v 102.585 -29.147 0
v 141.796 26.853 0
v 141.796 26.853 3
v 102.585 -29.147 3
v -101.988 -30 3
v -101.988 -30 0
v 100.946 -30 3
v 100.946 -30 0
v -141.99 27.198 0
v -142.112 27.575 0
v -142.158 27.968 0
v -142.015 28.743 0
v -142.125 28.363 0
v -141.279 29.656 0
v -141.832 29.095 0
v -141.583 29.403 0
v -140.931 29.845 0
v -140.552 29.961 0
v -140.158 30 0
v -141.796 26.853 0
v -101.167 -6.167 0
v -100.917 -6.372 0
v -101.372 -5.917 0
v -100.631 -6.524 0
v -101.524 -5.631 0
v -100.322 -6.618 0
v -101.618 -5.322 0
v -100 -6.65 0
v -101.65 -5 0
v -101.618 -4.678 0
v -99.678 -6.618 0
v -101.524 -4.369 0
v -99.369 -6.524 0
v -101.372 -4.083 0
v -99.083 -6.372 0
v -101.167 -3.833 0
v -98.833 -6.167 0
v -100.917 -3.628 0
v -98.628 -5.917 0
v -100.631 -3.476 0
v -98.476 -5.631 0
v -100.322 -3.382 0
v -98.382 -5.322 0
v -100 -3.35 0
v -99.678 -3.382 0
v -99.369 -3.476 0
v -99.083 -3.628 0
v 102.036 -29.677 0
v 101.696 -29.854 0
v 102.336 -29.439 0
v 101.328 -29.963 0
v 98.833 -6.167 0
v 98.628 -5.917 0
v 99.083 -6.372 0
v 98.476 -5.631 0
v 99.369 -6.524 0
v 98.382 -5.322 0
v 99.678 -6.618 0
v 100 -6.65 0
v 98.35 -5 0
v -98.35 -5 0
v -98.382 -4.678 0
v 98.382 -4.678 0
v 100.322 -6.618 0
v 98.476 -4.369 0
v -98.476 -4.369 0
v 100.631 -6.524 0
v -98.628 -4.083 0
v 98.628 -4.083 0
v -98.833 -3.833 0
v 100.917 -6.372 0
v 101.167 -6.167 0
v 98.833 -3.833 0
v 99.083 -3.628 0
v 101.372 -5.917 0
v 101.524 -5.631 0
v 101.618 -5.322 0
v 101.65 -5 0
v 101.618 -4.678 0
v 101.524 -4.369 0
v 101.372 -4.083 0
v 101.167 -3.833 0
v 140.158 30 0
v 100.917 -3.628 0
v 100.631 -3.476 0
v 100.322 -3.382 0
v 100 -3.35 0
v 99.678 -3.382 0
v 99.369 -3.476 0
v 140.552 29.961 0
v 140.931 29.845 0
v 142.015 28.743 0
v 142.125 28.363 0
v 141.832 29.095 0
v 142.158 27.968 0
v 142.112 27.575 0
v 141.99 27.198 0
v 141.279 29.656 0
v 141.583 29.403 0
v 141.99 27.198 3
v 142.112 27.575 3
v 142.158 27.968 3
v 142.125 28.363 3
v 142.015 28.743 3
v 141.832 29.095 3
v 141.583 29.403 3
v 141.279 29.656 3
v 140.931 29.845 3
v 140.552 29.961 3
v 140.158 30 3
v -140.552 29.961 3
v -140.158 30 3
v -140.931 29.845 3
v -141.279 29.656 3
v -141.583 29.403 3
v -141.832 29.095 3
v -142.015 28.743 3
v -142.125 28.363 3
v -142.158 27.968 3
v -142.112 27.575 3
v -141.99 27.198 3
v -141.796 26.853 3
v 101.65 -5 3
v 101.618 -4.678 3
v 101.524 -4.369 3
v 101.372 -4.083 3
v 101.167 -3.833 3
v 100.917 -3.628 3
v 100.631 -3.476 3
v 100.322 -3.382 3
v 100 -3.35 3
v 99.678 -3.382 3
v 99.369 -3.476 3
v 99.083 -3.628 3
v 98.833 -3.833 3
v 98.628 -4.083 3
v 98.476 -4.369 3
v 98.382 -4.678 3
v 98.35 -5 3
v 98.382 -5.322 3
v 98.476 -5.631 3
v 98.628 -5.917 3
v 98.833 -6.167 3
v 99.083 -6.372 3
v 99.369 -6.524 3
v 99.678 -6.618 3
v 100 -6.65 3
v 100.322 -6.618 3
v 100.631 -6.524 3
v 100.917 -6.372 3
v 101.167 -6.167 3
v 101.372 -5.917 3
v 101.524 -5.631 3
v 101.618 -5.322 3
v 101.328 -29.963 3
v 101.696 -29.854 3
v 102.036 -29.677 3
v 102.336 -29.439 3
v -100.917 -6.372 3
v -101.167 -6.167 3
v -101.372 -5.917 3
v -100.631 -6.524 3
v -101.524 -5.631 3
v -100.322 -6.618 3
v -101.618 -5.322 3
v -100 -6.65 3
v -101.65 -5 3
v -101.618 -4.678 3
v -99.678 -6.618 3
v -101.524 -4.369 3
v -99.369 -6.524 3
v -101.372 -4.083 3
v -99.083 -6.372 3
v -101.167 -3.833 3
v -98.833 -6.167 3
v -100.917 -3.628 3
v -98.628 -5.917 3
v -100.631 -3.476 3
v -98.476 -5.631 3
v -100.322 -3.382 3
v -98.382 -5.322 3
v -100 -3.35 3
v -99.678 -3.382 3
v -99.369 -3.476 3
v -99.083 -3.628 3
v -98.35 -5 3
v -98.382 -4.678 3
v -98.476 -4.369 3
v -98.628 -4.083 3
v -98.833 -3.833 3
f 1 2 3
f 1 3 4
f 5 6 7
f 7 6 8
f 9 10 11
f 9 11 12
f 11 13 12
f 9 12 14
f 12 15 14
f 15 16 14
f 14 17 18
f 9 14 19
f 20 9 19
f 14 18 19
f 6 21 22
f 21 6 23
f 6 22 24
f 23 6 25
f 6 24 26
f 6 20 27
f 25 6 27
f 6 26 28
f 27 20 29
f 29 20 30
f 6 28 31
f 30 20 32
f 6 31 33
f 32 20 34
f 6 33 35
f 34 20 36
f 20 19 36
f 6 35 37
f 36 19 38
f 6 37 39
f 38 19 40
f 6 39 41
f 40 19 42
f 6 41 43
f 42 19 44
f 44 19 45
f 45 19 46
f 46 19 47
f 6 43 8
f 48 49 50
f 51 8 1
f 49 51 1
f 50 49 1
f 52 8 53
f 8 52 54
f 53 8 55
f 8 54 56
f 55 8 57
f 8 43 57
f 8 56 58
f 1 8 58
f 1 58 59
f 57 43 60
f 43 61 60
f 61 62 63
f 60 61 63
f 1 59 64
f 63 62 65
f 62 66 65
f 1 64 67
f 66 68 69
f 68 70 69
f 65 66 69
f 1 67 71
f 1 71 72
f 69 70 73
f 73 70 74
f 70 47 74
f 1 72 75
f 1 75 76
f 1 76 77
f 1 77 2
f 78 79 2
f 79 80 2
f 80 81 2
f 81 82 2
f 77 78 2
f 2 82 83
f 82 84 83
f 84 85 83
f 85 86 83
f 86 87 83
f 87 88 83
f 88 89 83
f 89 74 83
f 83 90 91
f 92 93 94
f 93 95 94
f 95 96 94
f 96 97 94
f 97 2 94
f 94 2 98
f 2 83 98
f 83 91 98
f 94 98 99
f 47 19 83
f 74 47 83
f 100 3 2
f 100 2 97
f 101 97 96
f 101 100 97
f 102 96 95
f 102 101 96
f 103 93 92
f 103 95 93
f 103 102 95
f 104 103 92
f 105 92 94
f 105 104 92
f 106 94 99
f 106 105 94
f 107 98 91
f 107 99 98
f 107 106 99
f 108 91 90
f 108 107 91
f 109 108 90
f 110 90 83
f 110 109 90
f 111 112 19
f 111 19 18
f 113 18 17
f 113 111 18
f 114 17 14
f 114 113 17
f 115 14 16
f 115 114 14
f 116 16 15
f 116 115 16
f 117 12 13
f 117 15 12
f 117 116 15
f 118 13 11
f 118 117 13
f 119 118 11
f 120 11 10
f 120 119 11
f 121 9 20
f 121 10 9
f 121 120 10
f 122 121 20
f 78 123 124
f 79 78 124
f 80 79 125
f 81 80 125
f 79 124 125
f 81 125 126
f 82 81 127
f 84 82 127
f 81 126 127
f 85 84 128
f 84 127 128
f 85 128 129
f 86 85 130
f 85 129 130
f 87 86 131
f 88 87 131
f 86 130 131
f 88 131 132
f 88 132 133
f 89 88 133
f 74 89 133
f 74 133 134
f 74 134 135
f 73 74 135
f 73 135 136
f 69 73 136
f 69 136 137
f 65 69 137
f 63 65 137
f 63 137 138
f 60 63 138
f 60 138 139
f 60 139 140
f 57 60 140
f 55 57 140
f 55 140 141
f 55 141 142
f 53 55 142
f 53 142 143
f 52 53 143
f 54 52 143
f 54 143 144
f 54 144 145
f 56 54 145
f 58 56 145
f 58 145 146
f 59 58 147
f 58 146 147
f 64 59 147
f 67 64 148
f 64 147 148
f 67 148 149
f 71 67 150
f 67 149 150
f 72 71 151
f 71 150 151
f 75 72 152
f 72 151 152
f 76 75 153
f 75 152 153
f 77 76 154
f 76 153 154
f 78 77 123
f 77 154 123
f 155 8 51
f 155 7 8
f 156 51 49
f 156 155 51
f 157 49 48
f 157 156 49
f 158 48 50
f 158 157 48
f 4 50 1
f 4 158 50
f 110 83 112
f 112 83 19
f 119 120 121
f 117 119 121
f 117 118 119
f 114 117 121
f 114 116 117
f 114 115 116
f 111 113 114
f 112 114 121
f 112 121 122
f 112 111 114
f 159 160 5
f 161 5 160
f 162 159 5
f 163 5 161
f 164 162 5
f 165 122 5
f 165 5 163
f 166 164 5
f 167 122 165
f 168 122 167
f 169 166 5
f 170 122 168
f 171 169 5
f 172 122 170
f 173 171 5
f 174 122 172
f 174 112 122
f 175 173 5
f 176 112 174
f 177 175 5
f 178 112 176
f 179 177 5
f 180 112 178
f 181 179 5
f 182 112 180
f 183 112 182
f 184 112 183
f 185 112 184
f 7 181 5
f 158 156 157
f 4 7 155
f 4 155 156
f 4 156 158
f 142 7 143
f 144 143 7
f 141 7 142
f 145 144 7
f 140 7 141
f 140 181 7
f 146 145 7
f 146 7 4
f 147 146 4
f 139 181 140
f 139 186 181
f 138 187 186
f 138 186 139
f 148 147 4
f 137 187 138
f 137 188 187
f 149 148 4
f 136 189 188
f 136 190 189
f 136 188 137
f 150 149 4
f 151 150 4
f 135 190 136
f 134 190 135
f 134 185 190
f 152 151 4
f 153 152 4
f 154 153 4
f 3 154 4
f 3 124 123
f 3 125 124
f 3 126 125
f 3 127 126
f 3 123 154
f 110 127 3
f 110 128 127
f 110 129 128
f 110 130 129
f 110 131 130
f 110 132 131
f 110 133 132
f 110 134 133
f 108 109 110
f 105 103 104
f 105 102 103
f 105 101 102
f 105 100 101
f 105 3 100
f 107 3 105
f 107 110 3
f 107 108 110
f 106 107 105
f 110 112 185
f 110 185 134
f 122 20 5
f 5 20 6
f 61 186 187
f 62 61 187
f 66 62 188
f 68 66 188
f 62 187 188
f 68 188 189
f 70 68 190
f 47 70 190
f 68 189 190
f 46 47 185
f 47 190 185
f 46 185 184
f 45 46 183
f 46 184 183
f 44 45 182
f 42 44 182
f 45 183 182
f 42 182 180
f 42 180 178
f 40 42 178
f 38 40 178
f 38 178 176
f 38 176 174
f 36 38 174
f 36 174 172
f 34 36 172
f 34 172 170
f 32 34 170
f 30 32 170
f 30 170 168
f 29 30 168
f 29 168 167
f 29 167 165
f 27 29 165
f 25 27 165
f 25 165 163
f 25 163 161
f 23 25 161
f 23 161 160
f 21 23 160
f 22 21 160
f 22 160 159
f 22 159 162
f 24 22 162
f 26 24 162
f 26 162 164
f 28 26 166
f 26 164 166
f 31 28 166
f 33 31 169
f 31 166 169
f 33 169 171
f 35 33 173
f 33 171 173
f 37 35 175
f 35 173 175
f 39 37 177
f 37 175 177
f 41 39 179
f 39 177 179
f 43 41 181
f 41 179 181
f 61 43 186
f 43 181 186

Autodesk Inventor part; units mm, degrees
ref_plane "YZ Plane" through (0, 0, 0) normal (1, 0, 0) x (0, 1, 0)
ref_plane "XZ Plane" through (0, 0, 0) normal (0, 1, 0) x (-1, 0, 0)
ref_plane "XY Plane" through (0, 0, 0) normal (0, 0, 1) x (1, 0, 0)
sketch "Sketch1" plane through (0, 0, 0) normal (0, 0, 1) x (1, 0, 0)
  line L0 (-144, -30) -> (144, -30)
  line L1 (144, -30) -> (144, 30)
  line L2 (144, 30) -> (-144, 30)
  line L3 (-144, 30) -> (-144, -30)
  line L4 (-144, -30) -> (144, 30) construction
  line L5 (144, -30) -> (-144, 30) construction
  line L6 (144, 30) -> (101.9875, -30)
  line L7 (-144, 30) -> (-101.9875, -30)
  point P0 (0, 0)
  dimension "d0" = 288
  dimension "d1" = 60
  dimension "d2" = 55
  dimension "d13" = 55
extrude "Extrusion1" add sketch "Sketch1" along normal blind 3 contours L7 L2 L6 L0
sketch "Sketch2" plane through (0, 0, 3) normal (0, 0, 1) x (1, 0, 0)
  circle A0 centre (-100, -5) radius 1.65
  line L0 (-101.9875, -30) -> (101.9875, -30) projected
  line L1 (-100, -5) -> (155.6099, -5) construction
  circle A1 centre (100, -5) radius 1.65
  point P0 (0, 0)
  dimension "d5" = 25
  dimension "d6" = 3.3
  dimension "d9" = 3.3
  dimension "d14" = 100
  dimension "d15" = 100
extrude "Extrusion2" cut sketch "Sketch2" against normal through all
fillet "Fillet1" radius 2 3 edges at (-144, 30, 1.5) (101.9875, -30, 1.5) (144, 30, 1.5)
sketch "Sketch3" plane through (0, 0, 3) normal (0, 0, 1) x (1, 0, 0)
  arc A0 (141.7963, 26.8528) -> (140.158, 30) centre (140.158, 28) ccw projected
  line L0 (140.158, 30) -> (-140.158, 30) projected
  arc A1 (-140.158, 30) -> (-141.7963, 26.8528) centre (-140.158, 28) ccw projected
  line L1 (-141.7963, 26.8528) -> (-101.9875, -30) projected
  line L2 (-101.9875, -30) -> (100.9464, -30) projected
  arc A2 (100.9464, -30) -> (102.5847, -29.1472) centre (100.9464, -28) ccw projected
  line L3 (102.5847, -29.1472) -> (141.7963, 26.8528) projected
  circle A3 centre (-100, -5) radius 1.65 projected
  circle A4 centre (100, -5) radius 1.65 projected
  point P0 (0, 0)
equation "\"d13\" = d2"
equation "\"d9\" = d6"
equation "\"d15\" = d14"
properties part number "UpperAcrylicSheetBack"
